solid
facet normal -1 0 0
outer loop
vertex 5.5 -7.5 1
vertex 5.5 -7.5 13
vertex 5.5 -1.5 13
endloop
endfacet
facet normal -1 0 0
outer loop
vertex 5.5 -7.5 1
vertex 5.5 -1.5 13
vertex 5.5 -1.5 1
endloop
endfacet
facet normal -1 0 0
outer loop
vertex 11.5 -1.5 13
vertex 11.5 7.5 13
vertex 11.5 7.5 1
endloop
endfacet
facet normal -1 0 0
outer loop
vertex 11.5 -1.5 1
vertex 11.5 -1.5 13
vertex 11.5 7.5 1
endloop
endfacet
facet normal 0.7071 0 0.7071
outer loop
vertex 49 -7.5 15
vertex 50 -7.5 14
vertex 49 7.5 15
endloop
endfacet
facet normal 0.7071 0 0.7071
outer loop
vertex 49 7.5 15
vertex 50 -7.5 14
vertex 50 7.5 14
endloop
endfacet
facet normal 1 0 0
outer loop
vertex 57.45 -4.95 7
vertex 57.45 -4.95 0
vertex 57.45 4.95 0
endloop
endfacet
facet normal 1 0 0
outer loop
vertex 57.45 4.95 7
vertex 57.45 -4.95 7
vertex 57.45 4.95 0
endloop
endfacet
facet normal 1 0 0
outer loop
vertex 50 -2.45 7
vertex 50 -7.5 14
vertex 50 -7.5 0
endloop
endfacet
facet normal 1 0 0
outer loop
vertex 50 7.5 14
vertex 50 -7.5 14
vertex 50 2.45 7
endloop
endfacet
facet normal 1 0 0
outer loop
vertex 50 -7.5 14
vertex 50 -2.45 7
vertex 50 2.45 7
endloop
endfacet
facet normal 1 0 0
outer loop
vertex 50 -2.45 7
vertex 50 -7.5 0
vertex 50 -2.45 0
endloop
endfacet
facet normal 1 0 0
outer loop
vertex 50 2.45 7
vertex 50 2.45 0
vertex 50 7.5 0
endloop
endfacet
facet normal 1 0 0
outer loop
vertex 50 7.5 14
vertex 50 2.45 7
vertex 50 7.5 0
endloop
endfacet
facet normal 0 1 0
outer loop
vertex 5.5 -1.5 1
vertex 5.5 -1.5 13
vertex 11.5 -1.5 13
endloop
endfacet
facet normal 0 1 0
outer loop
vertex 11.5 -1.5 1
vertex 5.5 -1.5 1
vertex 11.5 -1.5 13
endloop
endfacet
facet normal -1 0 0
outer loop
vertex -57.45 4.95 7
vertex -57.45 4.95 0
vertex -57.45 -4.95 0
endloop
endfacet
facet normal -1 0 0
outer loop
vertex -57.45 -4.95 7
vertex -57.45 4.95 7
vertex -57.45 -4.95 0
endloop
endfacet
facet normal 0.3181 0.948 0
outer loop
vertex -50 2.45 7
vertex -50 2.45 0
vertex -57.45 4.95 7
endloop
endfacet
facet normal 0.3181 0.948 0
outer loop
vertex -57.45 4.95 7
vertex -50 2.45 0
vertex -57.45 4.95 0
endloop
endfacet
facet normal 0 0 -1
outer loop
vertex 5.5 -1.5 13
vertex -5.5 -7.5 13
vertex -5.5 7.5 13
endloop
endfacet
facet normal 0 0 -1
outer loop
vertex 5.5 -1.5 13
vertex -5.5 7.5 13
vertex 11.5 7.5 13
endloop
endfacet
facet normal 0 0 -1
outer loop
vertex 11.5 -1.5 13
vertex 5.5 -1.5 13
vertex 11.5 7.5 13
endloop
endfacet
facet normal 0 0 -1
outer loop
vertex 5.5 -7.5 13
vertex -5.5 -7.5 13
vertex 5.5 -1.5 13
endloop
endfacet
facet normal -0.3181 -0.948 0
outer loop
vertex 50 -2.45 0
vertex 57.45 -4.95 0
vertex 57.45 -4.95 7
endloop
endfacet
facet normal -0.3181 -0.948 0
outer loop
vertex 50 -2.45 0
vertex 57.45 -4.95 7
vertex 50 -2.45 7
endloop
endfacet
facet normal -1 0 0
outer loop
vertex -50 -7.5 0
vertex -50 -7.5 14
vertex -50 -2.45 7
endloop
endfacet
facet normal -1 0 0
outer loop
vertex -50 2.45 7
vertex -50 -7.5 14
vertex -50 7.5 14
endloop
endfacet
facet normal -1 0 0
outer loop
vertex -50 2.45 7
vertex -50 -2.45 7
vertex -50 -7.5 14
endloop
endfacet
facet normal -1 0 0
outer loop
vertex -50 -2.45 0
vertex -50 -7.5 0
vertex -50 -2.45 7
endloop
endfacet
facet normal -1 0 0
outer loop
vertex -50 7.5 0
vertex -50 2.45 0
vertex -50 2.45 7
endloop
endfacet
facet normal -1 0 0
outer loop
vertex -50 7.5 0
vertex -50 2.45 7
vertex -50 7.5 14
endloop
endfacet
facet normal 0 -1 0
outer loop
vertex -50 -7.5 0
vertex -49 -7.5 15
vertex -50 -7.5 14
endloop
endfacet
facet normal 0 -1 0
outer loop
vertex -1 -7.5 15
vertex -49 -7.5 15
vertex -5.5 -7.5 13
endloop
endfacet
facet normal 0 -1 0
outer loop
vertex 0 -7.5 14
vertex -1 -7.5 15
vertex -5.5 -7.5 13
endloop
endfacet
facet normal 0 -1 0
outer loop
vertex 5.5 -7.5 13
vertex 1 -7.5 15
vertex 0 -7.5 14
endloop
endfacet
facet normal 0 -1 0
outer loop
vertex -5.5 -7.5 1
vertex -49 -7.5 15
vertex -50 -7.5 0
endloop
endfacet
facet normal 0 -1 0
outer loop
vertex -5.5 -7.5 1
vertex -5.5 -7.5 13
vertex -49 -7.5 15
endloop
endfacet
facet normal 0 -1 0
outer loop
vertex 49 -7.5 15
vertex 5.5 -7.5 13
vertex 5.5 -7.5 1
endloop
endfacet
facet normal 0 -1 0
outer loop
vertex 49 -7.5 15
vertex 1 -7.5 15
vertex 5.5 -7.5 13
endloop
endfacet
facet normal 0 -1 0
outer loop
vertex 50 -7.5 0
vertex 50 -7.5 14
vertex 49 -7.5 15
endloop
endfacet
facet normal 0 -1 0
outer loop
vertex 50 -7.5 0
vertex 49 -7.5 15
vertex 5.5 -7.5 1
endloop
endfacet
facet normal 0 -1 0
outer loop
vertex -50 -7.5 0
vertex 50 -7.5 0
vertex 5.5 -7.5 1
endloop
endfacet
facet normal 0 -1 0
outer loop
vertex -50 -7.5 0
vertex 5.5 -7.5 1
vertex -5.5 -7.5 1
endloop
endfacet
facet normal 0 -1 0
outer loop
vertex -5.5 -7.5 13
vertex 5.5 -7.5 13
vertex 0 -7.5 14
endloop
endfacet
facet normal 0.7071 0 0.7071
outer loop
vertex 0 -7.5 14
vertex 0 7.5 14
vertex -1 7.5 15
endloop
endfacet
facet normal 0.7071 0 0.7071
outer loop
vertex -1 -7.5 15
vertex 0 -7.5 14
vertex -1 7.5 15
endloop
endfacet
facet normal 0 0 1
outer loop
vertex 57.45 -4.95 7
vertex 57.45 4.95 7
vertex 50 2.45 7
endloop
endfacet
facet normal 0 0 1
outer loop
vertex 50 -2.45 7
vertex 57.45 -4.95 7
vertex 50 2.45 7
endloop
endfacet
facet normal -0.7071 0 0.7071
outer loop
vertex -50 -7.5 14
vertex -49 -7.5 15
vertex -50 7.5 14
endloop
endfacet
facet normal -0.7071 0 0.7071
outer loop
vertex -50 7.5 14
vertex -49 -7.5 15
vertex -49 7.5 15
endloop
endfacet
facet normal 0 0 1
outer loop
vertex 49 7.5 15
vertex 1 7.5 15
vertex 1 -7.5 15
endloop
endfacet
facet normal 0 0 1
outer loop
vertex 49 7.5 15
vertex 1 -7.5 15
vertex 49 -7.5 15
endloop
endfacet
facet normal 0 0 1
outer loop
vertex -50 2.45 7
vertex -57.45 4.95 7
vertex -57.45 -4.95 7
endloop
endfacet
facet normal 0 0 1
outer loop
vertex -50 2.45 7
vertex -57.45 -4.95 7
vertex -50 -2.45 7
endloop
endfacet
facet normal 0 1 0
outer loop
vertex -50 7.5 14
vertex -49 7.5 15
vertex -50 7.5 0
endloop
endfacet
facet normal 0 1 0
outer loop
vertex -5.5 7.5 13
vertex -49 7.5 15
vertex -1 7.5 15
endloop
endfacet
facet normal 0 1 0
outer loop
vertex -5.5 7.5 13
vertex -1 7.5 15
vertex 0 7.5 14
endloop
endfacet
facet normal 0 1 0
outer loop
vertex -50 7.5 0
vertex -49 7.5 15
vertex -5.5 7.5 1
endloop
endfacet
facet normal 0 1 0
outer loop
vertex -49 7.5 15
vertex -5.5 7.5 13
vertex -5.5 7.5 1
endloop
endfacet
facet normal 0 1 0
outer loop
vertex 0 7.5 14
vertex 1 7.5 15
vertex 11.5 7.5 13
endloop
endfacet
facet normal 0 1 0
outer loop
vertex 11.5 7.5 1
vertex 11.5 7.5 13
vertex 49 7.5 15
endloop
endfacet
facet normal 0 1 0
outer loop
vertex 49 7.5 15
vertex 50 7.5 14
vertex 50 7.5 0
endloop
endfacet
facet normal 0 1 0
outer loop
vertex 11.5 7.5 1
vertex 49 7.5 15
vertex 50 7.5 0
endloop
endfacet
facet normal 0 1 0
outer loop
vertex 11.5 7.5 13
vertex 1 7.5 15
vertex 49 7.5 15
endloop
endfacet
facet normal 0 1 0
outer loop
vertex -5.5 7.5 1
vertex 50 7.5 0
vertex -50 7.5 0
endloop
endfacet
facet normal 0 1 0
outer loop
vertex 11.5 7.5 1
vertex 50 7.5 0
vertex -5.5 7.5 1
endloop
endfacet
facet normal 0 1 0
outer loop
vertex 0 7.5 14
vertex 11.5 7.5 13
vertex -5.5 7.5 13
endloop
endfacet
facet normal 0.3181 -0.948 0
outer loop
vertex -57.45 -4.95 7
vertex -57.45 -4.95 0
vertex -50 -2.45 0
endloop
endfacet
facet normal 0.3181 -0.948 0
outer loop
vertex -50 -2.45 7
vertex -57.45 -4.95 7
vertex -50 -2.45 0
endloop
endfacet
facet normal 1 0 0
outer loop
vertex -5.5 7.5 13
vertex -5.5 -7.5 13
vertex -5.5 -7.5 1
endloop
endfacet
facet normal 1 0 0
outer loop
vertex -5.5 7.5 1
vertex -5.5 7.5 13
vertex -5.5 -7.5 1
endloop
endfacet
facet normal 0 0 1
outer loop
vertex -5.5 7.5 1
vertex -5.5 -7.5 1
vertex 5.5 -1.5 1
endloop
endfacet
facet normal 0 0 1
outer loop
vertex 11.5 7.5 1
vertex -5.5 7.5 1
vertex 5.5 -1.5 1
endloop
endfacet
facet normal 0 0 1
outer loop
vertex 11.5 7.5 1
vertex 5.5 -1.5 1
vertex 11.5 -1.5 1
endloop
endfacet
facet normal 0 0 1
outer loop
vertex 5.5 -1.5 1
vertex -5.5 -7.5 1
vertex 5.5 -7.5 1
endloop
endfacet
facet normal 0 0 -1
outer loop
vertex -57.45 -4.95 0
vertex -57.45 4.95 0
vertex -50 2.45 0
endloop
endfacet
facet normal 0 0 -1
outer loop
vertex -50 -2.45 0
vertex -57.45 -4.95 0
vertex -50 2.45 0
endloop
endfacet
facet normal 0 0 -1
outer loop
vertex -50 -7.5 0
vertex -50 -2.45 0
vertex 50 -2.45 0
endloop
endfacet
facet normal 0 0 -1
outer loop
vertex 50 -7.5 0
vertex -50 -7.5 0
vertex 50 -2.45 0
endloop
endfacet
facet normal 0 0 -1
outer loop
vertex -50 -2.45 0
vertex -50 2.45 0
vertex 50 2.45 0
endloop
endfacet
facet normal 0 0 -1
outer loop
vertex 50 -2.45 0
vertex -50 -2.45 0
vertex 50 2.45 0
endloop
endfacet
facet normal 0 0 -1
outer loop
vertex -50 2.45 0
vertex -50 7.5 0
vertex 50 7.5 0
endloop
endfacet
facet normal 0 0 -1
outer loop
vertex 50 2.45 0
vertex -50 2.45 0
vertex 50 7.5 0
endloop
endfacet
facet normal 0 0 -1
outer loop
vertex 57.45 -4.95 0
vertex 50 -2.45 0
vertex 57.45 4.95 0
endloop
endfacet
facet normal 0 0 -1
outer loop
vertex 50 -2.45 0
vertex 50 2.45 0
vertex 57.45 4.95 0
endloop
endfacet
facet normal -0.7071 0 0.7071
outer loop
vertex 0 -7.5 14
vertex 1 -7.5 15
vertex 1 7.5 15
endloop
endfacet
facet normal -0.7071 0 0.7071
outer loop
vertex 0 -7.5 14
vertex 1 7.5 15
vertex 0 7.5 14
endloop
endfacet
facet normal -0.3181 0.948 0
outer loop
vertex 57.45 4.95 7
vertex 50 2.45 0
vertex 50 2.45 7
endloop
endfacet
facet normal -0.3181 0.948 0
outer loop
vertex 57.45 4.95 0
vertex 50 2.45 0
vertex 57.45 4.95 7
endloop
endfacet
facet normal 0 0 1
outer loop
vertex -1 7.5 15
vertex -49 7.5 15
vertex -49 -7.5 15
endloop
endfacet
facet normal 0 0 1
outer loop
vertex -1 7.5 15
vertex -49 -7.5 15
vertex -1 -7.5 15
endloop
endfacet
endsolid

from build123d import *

# Parameters (mm, degrees)
SKETCH1_W               = 100
SKETCH1_H               = 15
BODY_DEPTH              = 15
CLICK_DEPTH             = 7
CLICK_CHAMFER_SIZE      = 1
SKETCH4_W               = 2
SKETCH4_H               = 15
FIELDMARK_DEPTH         = 2
FIELDMARK_CHAMFER_SIZE  = 2
CUT_EXTRUDE1_DEPTH      = 62.241346327
CUT_EXTRUDE1_DEPTH_BACK = 62.241346327
SKETCH5_W               = 11
SKETCH5_H               = 12
SKETCH6_W               = 17
SKETCH6_H               = 12
CUT_EXTRUDE2_DEPTH      = 9


with BuildPart() as part:
    # Sketch1 → Body (new body)
    with BuildSketch(Plane.XY):
        Rectangle(SKETCH1_W, SKETCH1_H)
    extrude(amount=BODY_DEPTH)

    # Sketch2 → Click (add)
    with BuildSketch(Plane.XY):
        Polygon((-50, 0), (-50, 2.45), (-57.45, 4.95), (-57.45, 0), (-57.45, -4.95), (-50, -2.45), align=None)
        Polygon((57.45, 0), (57.45, -4.95), (50, -2.45), (50, 0), (50, 2.45), (57.45, 4.95), align=None)
    extrude(amount=CLICK_DEPTH)

    # Click Chamfer
    click_chamfer_edges = [part.edges().sort_by_distance(p)[0] for p in [
        (-50, 0, 15),
        (50, 0, 15),
    ]]
    chamfer(click_chamfer_edges, length=CLICK_CHAMFER_SIZE)

    # Sketch4 → FieldMark (cut)
    with BuildSketch(Plane.XY.offset(15)):
        Rectangle(SKETCH4_W, SKETCH4_H)
    extrude(amount=-FIELDMARK_DEPTH, mode=Mode.SUBTRACT)

    # FieldMark Chamfer
    # the kernel refuses this chamfer: 2 mm, written as the material it adds along each edge
    with BuildSketch(Plane(origin=(1, -7.5, 13), x_dir=(0.02749587661058638, 0, 0.9996219169112968), z_dir=(0, 1, 0))) as fieldmark_chamfer_piece_1_section:
        Polygon((FIELDMARK_CHAMFER_SIZE * 0.999621916911, -FIELDMARK_CHAMFER_SIZE * 0.0274958766106), (-FIELDMARK_CHAMFER_SIZE * 0.0274958766106, -FIELDMARK_CHAMFER_SIZE * 0.999621916911), (0, 0), align=None)
    fieldmark_chamfer_piece_1 = extrude(amount=15, mode=Mode.PRIVATE)
    fieldmark_chamfer_piece_1 = split(fieldmark_chamfer_piece_1, bisect_by=Plane(origin=(0.339191691, 0, 15), z_dir=(0, 0, -1)), keep=Keep.TOP, mode=Mode.PRIVATE)
    add(fieldmark_chamfer_piece_1)
    with BuildSketch(Plane(origin=(-1, 7.5, 13), x_dir=(0.9996219169112968, 0, -0.027495876610586487), z_dir=(0, -1, 0))) as fieldmark_chamfer_piece_2_section:
        Polygon((FIELDMARK_CHAMFER_SIZE * 0.999621916911, FIELDMARK_CHAMFER_SIZE * 0.0274958766106), (-FIELDMARK_CHAMFER_SIZE * 0.0274958766106, FIELDMARK_CHAMFER_SIZE * 0.999621916911), (0, 0), align=None)
    fieldmark_chamfer_piece_2 = extrude(amount=15, mode=Mode.PRIVATE)
    fieldmark_chamfer_piece_2 = split(fieldmark_chamfer_piece_2, bisect_by=Plane(origin=(-0.339191691, 0, 15), z_dir=(0, 0, -1)), keep=Keep.TOP, mode=Mode.PRIVATE)
    add(fieldmark_chamfer_piece_2)

    # Sketch5 → Cut-Extrude1 (cut, two sides: drawn at the far end of the back side and taken through both)
    with BuildSketch(Plane(origin=(0, 7.5, 0), x_dir=(1, 0, 0), z_dir=(0, 1, 0)).offset(-CUT_EXTRUDE1_DEPTH_BACK)):
        with Locations((0, -7)):
            Rectangle(SKETCH5_W, SKETCH5_H)
    extrude(amount=CUT_EXTRUDE1_DEPTH + CUT_EXTRUDE1_DEPTH_BACK, mode=Mode.SUBTRACT)

    # Sketch6 → Cut-Extrude2 (cut)
    with BuildSketch(Plane(origin=(0, 7.5, 0), x_dir=(1, 0, 0), z_dir=(0, 1, 0))):
        with Locations((3, -7)):
            Rectangle(SKETCH6_W, SKETCH6_H)
    extrude(amount=-CUT_EXTRUDE2_DEPTH, mode=Mode.SUBTRACT)


solid = part.part
